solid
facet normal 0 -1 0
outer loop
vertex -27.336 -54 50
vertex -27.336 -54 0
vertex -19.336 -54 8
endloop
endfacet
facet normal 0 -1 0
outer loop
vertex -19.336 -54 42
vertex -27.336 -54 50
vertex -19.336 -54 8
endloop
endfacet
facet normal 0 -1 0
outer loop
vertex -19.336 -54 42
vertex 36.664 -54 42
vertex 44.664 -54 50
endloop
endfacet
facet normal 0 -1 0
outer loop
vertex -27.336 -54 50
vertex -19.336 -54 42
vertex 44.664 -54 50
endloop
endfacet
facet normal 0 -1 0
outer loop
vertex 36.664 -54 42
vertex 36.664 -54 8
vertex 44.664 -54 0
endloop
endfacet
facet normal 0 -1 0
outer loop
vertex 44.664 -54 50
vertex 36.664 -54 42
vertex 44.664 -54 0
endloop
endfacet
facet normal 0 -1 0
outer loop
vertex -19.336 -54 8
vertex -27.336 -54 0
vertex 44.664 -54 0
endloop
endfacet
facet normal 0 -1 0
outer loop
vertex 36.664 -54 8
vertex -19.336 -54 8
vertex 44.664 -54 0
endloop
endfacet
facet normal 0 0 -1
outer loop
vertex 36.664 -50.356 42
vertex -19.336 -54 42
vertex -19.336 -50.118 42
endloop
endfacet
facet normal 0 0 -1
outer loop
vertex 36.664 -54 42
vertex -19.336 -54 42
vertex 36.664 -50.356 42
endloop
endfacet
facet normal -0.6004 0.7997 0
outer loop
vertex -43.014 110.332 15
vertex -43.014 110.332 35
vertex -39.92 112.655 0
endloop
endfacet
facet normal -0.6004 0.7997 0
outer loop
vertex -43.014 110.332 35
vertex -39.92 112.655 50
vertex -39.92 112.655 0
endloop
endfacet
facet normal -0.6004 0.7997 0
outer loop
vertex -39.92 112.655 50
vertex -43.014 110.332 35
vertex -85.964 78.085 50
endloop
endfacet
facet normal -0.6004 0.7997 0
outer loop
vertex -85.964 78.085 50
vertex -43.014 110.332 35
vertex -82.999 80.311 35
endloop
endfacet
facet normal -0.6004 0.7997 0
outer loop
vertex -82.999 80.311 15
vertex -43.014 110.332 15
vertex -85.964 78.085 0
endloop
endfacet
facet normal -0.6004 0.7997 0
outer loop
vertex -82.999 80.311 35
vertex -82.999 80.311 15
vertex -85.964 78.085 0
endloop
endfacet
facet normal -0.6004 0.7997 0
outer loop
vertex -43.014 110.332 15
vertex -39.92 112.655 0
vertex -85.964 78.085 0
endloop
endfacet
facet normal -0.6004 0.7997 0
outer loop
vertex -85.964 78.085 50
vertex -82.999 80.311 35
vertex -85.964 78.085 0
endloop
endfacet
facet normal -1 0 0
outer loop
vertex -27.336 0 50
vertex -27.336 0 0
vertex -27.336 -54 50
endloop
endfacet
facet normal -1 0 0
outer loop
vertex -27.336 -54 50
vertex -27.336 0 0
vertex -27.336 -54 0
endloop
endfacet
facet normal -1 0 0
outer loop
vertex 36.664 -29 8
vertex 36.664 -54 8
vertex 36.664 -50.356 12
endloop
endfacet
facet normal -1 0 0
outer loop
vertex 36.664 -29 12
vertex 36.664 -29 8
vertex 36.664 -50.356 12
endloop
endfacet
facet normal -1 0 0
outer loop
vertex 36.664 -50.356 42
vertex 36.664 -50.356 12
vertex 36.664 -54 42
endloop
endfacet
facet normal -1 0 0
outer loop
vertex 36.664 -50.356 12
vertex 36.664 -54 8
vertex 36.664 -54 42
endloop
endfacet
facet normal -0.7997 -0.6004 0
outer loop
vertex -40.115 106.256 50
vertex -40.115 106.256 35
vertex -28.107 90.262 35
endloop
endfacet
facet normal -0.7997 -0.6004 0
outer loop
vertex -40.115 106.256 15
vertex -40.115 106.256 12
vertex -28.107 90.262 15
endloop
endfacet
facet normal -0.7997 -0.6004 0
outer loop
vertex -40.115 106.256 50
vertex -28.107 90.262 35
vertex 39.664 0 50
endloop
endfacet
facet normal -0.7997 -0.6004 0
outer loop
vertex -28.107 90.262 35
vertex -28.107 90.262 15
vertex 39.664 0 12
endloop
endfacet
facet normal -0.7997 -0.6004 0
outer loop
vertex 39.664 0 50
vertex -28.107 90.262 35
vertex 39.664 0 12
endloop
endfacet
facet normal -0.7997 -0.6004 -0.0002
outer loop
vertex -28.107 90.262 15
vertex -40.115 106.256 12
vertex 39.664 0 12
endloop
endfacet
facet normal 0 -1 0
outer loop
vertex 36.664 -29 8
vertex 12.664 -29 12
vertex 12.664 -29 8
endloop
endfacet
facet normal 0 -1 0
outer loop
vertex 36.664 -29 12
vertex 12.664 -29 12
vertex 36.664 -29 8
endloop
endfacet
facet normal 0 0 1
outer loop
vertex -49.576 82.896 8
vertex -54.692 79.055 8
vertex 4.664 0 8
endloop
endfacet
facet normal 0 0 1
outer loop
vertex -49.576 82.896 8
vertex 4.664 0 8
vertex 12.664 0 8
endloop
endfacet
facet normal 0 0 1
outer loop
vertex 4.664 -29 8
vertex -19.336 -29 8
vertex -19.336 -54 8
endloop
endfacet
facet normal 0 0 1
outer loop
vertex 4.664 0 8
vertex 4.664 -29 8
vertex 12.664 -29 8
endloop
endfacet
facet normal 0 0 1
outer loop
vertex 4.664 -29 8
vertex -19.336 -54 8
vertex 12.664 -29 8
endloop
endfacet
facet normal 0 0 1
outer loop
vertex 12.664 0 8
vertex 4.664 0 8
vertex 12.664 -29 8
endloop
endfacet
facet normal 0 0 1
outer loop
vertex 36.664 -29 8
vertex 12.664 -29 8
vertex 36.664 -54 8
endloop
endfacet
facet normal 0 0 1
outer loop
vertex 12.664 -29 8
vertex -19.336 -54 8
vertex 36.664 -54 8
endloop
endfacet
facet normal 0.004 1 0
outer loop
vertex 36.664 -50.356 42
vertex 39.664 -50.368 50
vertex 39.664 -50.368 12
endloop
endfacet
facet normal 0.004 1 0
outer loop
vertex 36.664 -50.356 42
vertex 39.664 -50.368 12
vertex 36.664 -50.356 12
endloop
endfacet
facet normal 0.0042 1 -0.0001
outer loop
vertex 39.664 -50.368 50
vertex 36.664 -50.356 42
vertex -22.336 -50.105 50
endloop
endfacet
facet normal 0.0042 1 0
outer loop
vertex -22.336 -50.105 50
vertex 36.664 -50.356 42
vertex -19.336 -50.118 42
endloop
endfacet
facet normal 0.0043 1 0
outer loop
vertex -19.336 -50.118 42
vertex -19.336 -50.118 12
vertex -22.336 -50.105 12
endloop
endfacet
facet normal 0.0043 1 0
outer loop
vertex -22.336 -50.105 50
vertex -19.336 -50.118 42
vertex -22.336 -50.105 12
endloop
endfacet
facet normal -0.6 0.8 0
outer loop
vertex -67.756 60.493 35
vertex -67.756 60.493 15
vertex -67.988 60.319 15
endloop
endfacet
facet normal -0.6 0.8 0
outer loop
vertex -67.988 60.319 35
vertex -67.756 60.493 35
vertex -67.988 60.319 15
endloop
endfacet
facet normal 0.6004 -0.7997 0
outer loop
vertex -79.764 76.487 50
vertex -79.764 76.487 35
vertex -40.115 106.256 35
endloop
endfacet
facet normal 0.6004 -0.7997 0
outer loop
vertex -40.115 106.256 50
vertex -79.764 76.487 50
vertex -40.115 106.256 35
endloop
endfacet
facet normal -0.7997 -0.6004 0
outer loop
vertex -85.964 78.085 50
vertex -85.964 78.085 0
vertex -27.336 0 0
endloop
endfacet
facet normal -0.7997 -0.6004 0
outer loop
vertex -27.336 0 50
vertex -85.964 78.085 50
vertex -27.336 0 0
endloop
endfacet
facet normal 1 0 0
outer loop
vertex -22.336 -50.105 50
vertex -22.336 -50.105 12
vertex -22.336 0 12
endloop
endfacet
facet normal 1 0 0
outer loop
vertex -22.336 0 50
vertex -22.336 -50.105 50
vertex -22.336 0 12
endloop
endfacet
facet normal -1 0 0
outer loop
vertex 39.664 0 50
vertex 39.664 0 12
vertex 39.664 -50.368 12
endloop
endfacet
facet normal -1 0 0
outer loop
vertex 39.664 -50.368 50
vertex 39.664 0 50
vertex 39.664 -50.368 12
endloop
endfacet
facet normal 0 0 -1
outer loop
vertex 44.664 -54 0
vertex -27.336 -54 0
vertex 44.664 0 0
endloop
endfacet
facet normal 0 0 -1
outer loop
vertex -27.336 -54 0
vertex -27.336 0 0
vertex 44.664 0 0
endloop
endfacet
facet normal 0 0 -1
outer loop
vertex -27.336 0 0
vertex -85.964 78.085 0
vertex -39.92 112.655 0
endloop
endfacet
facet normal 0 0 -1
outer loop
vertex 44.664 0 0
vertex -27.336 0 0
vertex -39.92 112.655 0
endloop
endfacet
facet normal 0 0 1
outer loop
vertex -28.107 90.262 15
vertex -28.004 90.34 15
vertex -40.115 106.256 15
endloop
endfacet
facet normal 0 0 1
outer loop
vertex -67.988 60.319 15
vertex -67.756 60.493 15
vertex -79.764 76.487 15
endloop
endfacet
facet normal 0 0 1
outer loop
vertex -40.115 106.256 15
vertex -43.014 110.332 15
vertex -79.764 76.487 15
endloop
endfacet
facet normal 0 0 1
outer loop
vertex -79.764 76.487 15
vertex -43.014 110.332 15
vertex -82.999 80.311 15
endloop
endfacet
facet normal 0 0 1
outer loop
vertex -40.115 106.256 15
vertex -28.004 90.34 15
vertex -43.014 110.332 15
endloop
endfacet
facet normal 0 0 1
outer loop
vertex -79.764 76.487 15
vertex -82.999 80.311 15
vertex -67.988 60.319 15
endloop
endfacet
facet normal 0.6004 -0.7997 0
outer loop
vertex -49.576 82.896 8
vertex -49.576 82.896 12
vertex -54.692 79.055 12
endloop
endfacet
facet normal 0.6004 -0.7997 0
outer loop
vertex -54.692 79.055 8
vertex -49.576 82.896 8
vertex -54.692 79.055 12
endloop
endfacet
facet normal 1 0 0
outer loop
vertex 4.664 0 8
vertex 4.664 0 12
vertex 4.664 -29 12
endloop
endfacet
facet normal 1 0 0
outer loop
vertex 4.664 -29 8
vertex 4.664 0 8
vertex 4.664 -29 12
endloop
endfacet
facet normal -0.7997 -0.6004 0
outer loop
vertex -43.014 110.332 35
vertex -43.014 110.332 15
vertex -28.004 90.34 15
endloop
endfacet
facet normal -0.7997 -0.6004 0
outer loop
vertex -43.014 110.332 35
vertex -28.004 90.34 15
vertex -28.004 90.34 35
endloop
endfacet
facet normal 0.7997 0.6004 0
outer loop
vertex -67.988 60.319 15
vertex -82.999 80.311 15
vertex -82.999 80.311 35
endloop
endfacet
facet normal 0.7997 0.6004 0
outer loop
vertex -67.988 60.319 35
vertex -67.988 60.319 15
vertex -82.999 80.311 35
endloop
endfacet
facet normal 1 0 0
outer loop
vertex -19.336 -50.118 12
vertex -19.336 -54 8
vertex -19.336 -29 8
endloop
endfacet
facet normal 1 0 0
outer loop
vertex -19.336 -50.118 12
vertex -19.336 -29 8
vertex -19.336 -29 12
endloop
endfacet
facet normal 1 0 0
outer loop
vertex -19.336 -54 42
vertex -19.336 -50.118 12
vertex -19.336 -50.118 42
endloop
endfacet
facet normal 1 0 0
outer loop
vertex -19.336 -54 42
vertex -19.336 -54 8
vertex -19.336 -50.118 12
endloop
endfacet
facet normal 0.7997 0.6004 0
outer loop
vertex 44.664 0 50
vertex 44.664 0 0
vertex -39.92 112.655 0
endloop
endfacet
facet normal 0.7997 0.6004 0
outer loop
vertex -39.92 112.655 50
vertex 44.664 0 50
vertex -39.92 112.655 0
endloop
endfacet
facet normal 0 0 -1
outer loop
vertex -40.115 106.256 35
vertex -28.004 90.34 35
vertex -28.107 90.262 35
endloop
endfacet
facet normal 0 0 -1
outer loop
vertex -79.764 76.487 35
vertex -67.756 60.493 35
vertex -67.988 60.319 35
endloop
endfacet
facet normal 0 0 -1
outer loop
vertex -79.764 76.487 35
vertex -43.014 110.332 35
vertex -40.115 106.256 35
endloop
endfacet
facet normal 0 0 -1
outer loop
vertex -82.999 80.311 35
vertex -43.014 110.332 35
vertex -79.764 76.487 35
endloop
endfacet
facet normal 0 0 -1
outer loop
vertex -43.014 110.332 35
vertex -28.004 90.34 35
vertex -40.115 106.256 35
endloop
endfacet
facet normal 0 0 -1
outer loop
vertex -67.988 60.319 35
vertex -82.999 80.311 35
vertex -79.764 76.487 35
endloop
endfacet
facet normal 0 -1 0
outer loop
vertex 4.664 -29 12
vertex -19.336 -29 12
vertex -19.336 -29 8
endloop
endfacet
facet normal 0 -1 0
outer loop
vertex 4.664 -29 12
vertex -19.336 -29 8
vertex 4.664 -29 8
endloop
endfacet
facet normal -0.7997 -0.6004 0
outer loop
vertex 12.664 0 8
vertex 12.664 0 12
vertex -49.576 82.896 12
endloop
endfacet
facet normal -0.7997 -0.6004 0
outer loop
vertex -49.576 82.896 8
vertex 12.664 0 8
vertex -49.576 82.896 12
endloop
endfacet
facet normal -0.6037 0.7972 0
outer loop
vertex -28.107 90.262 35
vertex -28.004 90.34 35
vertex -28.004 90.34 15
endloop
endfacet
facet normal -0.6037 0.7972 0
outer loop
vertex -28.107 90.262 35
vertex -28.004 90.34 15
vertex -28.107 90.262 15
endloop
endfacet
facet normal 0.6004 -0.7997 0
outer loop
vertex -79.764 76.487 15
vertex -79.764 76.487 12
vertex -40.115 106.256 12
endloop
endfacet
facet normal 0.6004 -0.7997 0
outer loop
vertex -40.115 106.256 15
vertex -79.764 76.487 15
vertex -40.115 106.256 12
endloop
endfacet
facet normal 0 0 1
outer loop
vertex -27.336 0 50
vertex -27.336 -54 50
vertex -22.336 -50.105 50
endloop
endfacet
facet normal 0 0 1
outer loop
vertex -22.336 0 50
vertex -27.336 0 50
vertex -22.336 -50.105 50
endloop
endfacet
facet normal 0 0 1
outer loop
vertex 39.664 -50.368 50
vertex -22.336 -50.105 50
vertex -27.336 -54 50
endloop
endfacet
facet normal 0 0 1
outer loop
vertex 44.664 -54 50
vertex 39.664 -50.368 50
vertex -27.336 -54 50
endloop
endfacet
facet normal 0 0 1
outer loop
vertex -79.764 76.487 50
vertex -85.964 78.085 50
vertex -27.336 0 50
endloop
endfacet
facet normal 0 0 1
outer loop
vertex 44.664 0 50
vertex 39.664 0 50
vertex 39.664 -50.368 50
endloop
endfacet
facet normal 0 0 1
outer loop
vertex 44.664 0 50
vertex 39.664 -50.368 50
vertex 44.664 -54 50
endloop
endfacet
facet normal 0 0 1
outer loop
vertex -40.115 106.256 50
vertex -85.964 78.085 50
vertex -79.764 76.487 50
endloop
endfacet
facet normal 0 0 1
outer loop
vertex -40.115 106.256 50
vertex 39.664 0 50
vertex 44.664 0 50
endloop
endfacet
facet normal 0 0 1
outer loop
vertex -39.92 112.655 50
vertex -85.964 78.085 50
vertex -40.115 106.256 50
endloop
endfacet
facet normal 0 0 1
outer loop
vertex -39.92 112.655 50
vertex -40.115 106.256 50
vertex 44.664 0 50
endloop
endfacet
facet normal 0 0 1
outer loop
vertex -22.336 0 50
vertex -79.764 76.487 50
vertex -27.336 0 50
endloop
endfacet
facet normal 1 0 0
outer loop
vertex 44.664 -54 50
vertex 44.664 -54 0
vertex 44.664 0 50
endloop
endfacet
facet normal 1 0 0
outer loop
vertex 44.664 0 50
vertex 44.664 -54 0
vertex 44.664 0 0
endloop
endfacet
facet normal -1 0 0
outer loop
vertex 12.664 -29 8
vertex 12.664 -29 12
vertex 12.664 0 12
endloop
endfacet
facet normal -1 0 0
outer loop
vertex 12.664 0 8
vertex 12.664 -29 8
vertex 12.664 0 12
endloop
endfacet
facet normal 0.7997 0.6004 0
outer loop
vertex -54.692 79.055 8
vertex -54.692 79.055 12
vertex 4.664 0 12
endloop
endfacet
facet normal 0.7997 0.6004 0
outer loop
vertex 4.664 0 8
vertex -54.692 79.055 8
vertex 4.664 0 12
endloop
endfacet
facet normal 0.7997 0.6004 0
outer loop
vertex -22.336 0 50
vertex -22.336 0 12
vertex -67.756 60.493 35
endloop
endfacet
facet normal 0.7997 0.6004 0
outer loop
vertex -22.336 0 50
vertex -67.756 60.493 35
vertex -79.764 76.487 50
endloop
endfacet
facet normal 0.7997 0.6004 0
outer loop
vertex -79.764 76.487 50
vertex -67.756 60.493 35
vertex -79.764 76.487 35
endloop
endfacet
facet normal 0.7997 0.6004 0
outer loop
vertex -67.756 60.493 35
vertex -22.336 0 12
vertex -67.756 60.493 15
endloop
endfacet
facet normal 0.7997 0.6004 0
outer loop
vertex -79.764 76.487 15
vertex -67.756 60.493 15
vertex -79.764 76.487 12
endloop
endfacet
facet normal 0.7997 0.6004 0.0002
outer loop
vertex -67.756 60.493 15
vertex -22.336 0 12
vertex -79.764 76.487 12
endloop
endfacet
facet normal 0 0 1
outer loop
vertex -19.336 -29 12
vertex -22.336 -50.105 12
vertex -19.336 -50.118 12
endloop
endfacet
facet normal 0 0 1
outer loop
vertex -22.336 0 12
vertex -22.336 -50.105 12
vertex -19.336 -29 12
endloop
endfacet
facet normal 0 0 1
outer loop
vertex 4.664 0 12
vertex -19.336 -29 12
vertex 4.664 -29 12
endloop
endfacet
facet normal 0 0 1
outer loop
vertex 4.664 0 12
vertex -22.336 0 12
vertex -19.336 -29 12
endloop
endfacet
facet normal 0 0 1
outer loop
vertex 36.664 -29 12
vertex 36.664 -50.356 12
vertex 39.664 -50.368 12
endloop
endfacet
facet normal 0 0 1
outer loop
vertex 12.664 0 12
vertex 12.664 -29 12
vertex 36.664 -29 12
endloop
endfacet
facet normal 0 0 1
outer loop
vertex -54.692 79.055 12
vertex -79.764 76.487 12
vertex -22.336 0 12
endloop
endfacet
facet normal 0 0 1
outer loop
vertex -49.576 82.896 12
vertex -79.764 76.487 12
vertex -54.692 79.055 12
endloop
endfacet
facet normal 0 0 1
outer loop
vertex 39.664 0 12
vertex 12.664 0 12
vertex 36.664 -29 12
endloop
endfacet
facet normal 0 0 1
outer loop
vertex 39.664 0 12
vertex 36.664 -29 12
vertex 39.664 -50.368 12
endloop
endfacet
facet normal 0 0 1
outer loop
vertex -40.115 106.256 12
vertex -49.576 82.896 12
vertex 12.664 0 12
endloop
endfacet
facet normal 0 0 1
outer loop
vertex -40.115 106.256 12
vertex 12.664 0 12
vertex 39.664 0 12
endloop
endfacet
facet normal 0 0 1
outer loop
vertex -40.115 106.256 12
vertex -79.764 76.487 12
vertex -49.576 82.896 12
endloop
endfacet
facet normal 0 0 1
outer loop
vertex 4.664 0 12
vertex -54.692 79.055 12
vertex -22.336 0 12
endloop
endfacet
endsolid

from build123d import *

# Parameters (mm, degrees)
F1_DEPTH = 12
F2_DEPTH = 50
F3_W     = 56
F3_H     = 34
F4_DEPTH = 25
F5_W     = 50
F5_H     = 20
F6_DEPTH = 25
F8_DEPTH = 4


with BuildPart() as f1:
    # F0 (on Top) → F1 (new body)
    with BuildSketch(Plane.XY):
        Polygon((-27.3359761563, -54), (44.6640238437, -54), (44.6640238437, -50), (44.6640238437, 0), (-39.9199636387, 112.655294226), (-85.9636434561, 78.0847215416), (-27.3359761563, 0), (-27.3359761563, -50), align=None)
        Polygon((39.6640238437, -50.3684133291), (-22.3359761563, -50.1054301858), (-22.3359761563, 0), (-79.7640645644, 76.4870324634), (-40.1153402772, 106.2561367194), (39.6640238437, 0), align=None, mode=Mode.SUBTRACT)
        Polygon((-22.3359761563, 0), (-22.3359761563, -50.1054301858), (39.6640238437, -50.3684133291), (39.6640238437, 0), (-40.1153402772, 106.2561367194), (-79.7640645644, 76.4870324634), align=None)
    extrude(amount=F1_DEPTH)

    # F0 (on Top) → F2 (join)
    with BuildSketch(Plane.XY):
        Polygon((-27.3359761563, -54), (44.6640238437, -54), (44.6640238437, -50), (44.6640238437, 0), (-39.9199636387, 112.655294226), (-85.9636434561, 78.0847215416), (-27.3359761563, 0), (-27.3359761563, -50), align=None)
        Polygon((39.6640238437, -50.3684133291), (-22.3359761563, -50.1054301858), (-22.3359761563, 0), (-79.7640645644, 76.4870324634), (-40.1153402772, 106.2561367194), (39.6640238437, 0), align=None, mode=Mode.SUBTRACT)
    extrude(amount=F2_DEPTH)

    # F3 (on face) → F4 (cut)
    with BuildSketch(Plane.XZ.offset(54)):
        with Locations((8.6640238437, 25)):
            Rectangle(F3_W, F3_H)
    extrude(amount=-F4_DEPTH, mode=Mode.SUBTRACT)

    # F5 (on face) → F6 (cut)
    with BuildSketch(Plane(origin=(-68.4824082667, 91.210004189, 0), x_dir=(-0.7996846585, -0.6004202253, 0), z_dir=(-0.6004202253, 0.7996846585, 0))):
        with Locations((-6.8476465531, 25)):
            Rectangle(F5_W, F5_H)
    extrude(amount=-F6_DEPTH, mode=Mode.SUBTRACT)

    # F7 (on face) → F8 (cut)
    with BuildSketch(Plane.XY.offset(12)):
        Polygon((-49.5763184557, 82.8963528815), (-54.6922828798, 79.0551781388), (4.6640238437, 0), (4.6640238437, -29), (12.6640238437, -29), (12.6640238437, 0), align=None)
    extrude(amount=-F8_DEPTH, mode=Mode.SUBTRACT)


solid = f1.part
